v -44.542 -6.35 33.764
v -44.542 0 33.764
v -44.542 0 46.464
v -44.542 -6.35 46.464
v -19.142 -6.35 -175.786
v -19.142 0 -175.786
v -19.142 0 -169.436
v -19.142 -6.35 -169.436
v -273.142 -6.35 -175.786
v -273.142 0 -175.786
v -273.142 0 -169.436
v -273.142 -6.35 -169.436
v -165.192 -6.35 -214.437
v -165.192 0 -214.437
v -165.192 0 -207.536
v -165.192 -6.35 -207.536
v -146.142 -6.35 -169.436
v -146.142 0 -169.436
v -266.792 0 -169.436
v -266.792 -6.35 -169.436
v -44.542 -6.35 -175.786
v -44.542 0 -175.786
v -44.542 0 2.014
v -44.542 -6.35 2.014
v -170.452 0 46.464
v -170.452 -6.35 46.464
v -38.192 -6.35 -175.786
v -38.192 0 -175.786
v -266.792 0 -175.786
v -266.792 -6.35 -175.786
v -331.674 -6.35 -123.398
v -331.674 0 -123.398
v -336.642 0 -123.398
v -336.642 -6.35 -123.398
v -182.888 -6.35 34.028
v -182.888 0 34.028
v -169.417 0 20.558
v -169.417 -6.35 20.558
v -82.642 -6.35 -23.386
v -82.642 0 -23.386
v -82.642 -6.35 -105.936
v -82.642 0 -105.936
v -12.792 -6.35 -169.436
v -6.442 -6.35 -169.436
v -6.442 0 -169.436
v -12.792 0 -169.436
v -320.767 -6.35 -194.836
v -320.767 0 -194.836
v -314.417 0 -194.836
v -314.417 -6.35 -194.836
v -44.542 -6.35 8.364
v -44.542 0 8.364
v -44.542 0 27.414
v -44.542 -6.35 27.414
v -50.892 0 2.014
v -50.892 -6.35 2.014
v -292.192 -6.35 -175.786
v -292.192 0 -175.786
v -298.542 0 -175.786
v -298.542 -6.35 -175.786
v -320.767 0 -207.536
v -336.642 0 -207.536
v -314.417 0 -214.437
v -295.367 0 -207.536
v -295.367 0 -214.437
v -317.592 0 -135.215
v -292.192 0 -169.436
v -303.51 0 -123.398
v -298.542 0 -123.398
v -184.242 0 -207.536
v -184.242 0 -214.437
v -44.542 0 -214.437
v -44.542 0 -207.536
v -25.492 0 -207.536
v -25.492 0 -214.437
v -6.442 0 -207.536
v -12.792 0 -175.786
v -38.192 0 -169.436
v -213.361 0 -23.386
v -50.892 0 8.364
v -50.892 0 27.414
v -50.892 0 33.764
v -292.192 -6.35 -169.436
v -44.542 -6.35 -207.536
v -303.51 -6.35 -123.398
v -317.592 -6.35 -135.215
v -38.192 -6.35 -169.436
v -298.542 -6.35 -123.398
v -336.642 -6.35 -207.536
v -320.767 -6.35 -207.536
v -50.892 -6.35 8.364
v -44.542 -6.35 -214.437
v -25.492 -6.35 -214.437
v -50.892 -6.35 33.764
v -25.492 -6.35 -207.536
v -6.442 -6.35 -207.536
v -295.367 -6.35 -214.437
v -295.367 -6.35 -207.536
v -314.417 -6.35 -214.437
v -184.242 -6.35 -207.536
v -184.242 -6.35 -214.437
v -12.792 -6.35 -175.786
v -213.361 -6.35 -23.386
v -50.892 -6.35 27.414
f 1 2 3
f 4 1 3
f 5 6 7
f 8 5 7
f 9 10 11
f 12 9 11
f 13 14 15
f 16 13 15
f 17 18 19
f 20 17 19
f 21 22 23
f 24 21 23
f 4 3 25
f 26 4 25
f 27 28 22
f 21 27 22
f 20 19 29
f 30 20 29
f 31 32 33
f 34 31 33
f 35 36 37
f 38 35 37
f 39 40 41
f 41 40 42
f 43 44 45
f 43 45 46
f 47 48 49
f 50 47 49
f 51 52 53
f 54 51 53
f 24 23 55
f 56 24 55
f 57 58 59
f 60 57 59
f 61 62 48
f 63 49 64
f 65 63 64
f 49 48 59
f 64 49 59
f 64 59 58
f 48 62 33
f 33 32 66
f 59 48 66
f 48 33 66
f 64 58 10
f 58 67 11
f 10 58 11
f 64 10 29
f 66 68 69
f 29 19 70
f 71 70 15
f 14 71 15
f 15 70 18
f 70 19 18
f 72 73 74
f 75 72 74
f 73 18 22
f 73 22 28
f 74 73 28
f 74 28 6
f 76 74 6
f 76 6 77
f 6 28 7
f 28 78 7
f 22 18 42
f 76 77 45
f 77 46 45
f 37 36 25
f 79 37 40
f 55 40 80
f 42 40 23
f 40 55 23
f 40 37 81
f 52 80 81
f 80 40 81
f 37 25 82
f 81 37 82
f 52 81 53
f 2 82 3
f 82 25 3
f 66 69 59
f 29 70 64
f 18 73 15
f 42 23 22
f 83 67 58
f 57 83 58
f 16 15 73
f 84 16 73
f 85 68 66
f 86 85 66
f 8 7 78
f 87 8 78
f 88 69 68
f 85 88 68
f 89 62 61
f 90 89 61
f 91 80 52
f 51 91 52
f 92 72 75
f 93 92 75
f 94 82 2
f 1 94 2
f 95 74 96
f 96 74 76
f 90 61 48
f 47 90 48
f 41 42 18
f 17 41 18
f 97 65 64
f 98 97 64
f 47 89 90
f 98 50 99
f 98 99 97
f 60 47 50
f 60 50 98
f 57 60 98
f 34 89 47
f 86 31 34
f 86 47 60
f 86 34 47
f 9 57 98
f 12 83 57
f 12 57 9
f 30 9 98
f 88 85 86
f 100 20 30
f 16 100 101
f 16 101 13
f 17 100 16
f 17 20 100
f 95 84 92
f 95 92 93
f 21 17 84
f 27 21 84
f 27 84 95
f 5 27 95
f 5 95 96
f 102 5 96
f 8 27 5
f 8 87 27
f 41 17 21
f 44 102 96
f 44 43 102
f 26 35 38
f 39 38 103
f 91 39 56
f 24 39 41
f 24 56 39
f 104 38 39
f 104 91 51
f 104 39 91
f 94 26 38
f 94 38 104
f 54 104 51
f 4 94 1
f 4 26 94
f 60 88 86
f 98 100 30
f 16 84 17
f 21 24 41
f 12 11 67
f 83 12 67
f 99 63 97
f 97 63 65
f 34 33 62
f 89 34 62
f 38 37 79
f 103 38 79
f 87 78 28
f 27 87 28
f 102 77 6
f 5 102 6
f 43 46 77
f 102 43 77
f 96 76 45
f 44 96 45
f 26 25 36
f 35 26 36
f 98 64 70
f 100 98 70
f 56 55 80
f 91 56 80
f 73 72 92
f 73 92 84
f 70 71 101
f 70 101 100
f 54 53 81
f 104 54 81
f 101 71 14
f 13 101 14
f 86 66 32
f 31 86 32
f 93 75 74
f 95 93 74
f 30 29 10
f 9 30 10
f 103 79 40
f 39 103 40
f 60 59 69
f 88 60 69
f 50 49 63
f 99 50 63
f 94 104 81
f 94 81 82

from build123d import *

# Parameters (mm, degrees)
F0_W     = 19.05
F0_H     = 6.901241
F1_DEPTH = 6.35


with BuildPart() as f1:
    # F0 (on Front) → F1 (new body)
    with BuildSketch(Plane.XZ):
        Polygon((-82.641583, -23.385886), (-82.641583, -105.935886), (-146.141583, -169.435886), (-266.791583, -169.435886), (-266.791583, -175.785886), (-273.141583, -175.785886), (-273.141583, -169.435886), (-292.191583, -169.435886), (-292.191583, -175.785886), (-298.541583, -175.785886), (-298.541583, -123.398386), (-303.509617, -123.398386), (-317.591583, -135.214559), (-331.673549, -123.398386), (-336.641583, -123.398386), (-336.641583, -207.535886), (-320.766583, -207.535886), (-320.766583, -194.835886), (-314.416583, -194.835886), (-314.416583, -207.535886), (-295.366583, -207.535886), (-184.241583, -207.535886), (-165.191583, -207.535886), (-44.541583, -207.535886), (-25.491583, -207.535886), (-6.441583, -207.535886), (-6.441583, -169.435886), (-12.791583, -169.435886), (-12.791583, -175.785886), (-19.141583, -175.785886), (-19.141583, -169.435886), (-38.191583, -169.435886), (-38.191583, -175.785886), (-44.541583, -175.785886), (-44.541583, 2.014114), (-50.891583, 2.014114), (-50.891583, 8.364114), (-44.541583, 8.364114), (-44.541583, 27.414114), (-50.891583, 27.414114), (-50.891583, 33.764114), (-44.541583, 33.764114), (-44.541583, 46.464114), (-170.452095, 46.464114), (-182.887741, 34.028468), (-169.417357, 20.558084), (-213.361327, -23.385886), align=None)
        with Locations((-304.891583, -210.986506)):
            Rectangle(F0_W, F0_H)
        with Locations((-174.716583, -210.986506)):
            Rectangle(F0_W, F0_H)
        with Locations((-35.016583, -210.986506)):
            Rectangle(F0_W, F0_H)
    extrude(amount=F1_DEPTH)


solid = f1.part
